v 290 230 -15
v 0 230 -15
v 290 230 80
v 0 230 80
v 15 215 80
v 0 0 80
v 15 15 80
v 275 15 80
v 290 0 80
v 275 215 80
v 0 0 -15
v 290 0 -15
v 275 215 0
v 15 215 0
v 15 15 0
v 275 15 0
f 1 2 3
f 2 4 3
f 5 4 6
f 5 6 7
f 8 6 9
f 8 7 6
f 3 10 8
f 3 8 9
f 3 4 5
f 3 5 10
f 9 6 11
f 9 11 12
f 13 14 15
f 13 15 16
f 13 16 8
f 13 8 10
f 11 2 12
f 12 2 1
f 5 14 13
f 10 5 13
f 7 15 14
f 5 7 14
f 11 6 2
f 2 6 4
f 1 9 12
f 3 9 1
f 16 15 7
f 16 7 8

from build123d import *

# Parameters (mm, degrees)
SKETCH_1_W      = 290
SKETCH_1_H      = 230
SKETCH_1_W_2    = 260
SKETCH_1_H_2    = 200
EXTRUDE_1_DEPTH = 80
SKETCH_1_2_W    = 290
SKETCH_1_2_H    = 230
EXTRUDE_2_DEPTH = 15


with BuildPart() as part:
    # 草图1 → 凸台-拉伸1 (new body)
    with BuildSketch(Plane.XY):
        with Locations((145, 115)):
            Rectangle(SKETCH_1_W, SKETCH_1_H)
        with Locations((145, 115)):
            Rectangle(SKETCH_1_W_2, SKETCH_1_H_2, mode=Mode.SUBTRACT)
    extrude(amount=EXTRUDE_1_DEPTH)

    # 草图1<2> → 凸台-拉伸2 (add)
    with BuildSketch(Plane.XY):
        with Locations((145, 115)):
            Rectangle(SKETCH_1_2_W, SKETCH_1_2_H)
    extrude(amount=-EXTRUDE_2_DEPTH)


solid = part.part
